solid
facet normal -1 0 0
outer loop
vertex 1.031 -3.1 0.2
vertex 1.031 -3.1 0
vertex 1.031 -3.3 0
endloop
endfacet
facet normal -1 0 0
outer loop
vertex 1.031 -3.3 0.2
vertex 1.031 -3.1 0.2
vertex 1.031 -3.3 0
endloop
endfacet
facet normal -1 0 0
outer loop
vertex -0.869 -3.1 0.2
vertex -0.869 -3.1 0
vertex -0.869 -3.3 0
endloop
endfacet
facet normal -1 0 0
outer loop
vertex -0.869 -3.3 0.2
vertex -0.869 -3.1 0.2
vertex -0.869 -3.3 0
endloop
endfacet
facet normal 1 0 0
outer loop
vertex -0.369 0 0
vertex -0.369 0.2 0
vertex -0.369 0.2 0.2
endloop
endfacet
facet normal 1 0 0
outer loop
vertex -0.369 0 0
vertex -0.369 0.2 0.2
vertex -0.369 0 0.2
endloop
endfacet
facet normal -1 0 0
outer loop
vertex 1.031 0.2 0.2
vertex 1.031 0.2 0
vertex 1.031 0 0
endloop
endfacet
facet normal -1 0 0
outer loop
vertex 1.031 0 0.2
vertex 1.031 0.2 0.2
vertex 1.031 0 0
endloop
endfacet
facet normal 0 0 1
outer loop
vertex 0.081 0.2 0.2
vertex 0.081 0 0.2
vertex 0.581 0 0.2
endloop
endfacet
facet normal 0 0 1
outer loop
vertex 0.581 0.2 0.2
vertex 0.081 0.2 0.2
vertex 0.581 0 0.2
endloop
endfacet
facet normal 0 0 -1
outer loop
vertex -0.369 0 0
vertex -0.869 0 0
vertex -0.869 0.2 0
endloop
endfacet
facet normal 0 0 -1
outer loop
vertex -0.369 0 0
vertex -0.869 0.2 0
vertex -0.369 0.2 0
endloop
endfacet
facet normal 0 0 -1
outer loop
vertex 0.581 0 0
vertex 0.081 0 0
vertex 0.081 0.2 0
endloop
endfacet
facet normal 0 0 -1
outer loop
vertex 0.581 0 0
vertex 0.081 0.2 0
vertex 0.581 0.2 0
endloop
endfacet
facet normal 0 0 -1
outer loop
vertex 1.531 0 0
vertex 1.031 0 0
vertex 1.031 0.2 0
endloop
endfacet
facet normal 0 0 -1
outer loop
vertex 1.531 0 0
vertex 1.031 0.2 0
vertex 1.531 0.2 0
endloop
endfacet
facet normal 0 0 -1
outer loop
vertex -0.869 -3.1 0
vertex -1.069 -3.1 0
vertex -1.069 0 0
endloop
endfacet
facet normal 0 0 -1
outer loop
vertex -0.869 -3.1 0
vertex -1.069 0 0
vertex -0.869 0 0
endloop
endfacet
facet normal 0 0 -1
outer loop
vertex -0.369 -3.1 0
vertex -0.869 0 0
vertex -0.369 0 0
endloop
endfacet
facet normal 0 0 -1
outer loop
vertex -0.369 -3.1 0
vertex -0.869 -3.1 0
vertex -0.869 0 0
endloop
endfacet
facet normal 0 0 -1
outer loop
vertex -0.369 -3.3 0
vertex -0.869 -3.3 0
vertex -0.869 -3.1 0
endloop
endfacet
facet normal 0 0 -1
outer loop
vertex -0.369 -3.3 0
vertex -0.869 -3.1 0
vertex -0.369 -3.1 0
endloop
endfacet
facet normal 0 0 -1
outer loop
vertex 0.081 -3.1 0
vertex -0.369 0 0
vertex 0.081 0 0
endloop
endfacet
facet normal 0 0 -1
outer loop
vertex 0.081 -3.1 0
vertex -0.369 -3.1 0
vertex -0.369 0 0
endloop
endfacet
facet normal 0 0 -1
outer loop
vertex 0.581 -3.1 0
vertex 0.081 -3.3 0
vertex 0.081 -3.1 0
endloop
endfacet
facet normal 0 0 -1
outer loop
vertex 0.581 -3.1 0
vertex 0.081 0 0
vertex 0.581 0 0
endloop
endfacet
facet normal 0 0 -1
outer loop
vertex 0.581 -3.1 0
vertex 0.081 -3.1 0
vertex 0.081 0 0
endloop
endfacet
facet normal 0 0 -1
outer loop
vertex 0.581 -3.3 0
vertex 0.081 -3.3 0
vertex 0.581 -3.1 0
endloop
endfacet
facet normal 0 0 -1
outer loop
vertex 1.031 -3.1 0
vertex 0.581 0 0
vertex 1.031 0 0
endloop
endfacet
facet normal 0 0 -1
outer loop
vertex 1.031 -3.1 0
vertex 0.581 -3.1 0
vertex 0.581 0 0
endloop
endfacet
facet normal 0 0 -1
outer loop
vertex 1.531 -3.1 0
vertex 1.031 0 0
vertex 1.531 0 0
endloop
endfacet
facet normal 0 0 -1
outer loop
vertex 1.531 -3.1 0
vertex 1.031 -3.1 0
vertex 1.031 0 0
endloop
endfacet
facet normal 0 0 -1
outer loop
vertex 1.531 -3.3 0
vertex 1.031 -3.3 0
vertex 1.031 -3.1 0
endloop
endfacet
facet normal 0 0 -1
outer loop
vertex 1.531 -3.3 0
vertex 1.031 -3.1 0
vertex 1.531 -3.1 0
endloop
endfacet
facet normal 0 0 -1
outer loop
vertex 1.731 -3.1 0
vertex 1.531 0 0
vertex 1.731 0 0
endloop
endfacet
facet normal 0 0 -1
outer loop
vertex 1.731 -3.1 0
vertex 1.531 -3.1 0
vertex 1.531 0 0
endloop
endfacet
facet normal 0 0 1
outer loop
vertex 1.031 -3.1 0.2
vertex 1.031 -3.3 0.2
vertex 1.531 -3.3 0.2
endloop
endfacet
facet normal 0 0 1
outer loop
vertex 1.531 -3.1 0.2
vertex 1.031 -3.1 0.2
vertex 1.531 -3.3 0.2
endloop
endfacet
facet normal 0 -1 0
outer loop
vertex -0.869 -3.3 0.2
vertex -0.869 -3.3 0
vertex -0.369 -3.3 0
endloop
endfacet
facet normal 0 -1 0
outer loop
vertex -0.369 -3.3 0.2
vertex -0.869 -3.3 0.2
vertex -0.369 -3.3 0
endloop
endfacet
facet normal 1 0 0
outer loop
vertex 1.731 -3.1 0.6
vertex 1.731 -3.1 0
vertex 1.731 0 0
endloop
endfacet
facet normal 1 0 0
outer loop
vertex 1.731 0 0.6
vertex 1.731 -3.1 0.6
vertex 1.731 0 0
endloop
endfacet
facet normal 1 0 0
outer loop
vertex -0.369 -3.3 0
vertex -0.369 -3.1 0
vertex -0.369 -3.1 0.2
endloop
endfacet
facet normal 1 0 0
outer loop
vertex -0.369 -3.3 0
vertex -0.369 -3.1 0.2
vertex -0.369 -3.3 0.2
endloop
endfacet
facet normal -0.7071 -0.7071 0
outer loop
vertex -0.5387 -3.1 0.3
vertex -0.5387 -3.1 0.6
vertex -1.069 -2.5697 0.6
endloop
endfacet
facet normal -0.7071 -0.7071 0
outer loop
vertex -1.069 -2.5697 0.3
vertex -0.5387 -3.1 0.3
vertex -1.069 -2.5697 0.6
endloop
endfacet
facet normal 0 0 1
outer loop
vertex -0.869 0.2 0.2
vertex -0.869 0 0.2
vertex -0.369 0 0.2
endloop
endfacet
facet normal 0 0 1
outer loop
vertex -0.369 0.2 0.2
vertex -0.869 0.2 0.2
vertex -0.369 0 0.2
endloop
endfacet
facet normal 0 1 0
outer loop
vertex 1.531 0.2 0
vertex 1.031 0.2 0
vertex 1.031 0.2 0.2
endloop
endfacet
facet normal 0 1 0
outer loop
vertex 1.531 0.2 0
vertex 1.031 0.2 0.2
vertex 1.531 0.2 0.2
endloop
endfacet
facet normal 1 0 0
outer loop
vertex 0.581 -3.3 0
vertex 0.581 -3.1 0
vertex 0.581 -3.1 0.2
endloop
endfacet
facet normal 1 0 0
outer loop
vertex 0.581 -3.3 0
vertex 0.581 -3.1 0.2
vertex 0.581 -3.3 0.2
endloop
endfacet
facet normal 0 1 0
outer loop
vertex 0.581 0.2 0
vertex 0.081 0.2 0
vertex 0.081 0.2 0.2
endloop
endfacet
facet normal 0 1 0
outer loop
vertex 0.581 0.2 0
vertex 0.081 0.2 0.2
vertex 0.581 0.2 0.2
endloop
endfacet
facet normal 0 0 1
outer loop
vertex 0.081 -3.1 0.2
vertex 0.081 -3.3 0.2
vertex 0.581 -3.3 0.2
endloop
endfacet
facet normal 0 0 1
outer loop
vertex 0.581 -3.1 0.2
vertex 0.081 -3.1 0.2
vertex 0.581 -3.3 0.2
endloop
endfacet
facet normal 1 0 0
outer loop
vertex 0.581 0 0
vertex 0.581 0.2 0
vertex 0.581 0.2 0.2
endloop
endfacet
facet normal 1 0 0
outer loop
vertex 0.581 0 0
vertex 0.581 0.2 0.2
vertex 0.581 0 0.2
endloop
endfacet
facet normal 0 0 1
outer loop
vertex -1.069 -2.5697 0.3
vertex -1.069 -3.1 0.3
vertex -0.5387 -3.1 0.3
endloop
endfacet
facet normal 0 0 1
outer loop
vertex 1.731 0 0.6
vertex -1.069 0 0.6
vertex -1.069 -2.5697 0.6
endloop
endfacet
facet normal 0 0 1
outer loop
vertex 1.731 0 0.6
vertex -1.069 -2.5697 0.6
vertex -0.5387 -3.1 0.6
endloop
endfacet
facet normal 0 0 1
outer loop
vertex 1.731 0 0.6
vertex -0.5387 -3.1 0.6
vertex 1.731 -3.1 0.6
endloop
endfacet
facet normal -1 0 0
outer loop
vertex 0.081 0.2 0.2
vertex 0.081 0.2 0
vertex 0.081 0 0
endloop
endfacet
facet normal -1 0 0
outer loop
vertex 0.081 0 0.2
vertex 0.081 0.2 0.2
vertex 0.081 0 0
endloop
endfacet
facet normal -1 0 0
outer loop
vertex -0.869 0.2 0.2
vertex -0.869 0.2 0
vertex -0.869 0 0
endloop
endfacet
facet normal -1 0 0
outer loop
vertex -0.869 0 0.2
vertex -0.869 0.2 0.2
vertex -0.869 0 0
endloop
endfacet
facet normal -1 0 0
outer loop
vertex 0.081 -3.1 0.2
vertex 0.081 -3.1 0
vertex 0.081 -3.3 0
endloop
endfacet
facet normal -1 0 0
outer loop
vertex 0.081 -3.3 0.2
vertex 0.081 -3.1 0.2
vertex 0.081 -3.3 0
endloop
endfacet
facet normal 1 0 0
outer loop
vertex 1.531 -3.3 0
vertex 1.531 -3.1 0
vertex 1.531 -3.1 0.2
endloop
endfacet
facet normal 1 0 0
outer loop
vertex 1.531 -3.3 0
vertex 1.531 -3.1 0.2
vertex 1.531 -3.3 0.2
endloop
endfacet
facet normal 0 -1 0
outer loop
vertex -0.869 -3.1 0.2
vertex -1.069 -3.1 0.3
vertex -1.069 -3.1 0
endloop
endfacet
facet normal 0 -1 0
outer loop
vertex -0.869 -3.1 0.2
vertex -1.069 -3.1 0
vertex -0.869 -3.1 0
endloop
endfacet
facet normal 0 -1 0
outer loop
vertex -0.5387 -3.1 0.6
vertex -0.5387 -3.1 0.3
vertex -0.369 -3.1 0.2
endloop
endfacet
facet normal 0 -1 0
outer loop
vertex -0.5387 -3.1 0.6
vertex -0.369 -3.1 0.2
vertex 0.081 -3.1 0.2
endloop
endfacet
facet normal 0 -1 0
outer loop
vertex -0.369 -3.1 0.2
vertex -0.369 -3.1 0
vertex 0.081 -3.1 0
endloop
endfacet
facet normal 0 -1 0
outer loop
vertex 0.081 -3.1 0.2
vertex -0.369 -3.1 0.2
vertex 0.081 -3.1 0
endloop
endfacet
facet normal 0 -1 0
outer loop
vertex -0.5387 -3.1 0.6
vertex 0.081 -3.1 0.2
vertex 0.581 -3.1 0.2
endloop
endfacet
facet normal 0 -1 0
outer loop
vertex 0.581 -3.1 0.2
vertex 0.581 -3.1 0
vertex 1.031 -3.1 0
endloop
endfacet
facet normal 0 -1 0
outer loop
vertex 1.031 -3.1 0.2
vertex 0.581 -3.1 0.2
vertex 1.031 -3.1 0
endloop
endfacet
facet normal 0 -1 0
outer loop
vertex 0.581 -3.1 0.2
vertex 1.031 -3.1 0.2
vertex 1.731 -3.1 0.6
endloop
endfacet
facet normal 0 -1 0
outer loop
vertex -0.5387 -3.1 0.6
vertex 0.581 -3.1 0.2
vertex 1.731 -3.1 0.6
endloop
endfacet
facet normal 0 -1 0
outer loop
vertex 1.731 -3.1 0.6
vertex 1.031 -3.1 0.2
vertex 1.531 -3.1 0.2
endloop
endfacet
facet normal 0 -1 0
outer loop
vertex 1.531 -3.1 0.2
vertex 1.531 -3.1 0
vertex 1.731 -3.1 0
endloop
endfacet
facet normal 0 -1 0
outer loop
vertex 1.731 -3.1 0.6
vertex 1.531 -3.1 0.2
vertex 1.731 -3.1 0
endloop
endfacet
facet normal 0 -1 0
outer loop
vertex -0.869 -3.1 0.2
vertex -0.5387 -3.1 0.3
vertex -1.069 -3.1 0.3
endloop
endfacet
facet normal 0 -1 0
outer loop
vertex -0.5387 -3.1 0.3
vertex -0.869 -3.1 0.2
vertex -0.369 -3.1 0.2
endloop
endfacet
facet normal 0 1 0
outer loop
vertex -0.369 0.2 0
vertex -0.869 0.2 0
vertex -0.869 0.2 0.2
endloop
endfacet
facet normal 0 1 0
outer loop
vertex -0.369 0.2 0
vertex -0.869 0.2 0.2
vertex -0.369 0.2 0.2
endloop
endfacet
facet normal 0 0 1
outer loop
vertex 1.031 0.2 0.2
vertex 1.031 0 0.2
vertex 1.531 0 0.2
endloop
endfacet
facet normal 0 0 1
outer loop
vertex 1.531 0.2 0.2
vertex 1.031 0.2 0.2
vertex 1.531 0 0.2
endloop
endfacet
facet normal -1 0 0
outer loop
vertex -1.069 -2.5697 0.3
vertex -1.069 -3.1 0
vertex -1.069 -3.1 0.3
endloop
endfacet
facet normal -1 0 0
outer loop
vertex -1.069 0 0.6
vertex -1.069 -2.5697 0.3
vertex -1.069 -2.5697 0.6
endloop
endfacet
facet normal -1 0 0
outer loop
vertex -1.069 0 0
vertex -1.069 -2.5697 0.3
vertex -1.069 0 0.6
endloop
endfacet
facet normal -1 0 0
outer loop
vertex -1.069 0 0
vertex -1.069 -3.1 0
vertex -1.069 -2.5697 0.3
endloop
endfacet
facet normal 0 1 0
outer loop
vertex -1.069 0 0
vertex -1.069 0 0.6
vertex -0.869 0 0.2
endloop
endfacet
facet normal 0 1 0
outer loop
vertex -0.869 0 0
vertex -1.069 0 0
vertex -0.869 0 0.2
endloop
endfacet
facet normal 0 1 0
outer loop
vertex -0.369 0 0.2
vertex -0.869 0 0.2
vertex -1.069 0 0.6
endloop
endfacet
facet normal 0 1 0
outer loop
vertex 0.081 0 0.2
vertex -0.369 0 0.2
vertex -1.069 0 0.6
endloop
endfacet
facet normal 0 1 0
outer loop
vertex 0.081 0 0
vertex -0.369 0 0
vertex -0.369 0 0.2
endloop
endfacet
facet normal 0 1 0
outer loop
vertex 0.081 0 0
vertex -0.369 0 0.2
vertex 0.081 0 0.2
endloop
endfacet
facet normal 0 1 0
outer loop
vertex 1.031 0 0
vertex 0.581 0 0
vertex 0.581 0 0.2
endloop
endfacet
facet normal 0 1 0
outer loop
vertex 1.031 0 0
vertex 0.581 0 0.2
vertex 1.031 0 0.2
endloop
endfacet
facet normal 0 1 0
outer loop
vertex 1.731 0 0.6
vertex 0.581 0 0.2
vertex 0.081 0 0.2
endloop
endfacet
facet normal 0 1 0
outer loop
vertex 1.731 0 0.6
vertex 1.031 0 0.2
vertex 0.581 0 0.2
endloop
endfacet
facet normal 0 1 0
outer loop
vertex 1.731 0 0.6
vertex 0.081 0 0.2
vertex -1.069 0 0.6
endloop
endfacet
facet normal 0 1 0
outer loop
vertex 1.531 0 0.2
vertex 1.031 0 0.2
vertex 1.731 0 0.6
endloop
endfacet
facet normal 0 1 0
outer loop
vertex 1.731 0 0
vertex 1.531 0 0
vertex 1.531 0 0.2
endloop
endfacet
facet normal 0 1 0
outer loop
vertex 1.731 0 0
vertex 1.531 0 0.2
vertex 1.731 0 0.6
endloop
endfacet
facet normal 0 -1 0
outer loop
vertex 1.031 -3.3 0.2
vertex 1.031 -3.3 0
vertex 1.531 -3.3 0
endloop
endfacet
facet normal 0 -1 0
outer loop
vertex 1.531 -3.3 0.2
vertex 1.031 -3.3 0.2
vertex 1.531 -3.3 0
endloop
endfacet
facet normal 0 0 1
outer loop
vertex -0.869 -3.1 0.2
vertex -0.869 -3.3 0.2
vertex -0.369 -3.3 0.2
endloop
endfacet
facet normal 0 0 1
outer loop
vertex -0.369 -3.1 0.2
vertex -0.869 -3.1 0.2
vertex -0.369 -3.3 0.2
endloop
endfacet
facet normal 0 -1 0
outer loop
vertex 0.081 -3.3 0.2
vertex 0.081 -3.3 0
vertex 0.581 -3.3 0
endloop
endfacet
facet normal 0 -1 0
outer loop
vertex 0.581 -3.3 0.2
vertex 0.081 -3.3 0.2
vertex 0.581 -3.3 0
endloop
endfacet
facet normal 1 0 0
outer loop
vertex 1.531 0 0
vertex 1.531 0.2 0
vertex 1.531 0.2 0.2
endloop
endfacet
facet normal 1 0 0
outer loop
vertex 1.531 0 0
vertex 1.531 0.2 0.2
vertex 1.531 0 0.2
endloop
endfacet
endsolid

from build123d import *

# Parameters (mm, degrees)
F0_W     = 2.8
F0_H     = 3.1
F1_DEPTH = 0.6
F3_DEPTH = 0.3
F4_W     = 0.5
F4_H     = 0.8
F5_DEPTH = 0.2


with BuildPart() as f1:
    # F0 (on Top) → F1 (new body)
    with BuildSketch(Plane.XY):
        with Locations((0.33098, -1.55)):
            Rectangle(F0_W, F0_H)
    extrude(amount=F1_DEPTH)

    # F2 (on face) → F3 (cut)
    with BuildSketch(Plane.XY.offset(0.6)):
        Polygon((-0.53869, -3.1), (-1.06902, -2.56967), (-1.06902, -3.1), align=None)
    extrude(amount=-F3_DEPTH, mode=Mode.SUBTRACT)

    # F4 (on face) → F5 (join)
    with BuildSketch(Plane(origin=(0, 0, 0), x_dir=(1, 0, 0), z_dir=(0, 0, -1))):
        with Locations((-0.61902, 0.2)):
            Rectangle(F4_W, F4_H)
        with Locations((0.33098, 0.2)):
            Rectangle(F4_W, F4_H)
        with Locations((1.28098, 0.2)):
            Rectangle(F4_W, F4_H)
        with Locations((1.28098, 2.9)):
            Rectangle(F4_W, F4_H)
        with Locations((0.33098, 2.9)):
            Rectangle(F4_W, F4_H)
        with Locations((-0.61902, 2.9)):
            Rectangle(F4_W, F4_H)
    extrude(amount=-F5_DEPTH)


solid = f1.part
